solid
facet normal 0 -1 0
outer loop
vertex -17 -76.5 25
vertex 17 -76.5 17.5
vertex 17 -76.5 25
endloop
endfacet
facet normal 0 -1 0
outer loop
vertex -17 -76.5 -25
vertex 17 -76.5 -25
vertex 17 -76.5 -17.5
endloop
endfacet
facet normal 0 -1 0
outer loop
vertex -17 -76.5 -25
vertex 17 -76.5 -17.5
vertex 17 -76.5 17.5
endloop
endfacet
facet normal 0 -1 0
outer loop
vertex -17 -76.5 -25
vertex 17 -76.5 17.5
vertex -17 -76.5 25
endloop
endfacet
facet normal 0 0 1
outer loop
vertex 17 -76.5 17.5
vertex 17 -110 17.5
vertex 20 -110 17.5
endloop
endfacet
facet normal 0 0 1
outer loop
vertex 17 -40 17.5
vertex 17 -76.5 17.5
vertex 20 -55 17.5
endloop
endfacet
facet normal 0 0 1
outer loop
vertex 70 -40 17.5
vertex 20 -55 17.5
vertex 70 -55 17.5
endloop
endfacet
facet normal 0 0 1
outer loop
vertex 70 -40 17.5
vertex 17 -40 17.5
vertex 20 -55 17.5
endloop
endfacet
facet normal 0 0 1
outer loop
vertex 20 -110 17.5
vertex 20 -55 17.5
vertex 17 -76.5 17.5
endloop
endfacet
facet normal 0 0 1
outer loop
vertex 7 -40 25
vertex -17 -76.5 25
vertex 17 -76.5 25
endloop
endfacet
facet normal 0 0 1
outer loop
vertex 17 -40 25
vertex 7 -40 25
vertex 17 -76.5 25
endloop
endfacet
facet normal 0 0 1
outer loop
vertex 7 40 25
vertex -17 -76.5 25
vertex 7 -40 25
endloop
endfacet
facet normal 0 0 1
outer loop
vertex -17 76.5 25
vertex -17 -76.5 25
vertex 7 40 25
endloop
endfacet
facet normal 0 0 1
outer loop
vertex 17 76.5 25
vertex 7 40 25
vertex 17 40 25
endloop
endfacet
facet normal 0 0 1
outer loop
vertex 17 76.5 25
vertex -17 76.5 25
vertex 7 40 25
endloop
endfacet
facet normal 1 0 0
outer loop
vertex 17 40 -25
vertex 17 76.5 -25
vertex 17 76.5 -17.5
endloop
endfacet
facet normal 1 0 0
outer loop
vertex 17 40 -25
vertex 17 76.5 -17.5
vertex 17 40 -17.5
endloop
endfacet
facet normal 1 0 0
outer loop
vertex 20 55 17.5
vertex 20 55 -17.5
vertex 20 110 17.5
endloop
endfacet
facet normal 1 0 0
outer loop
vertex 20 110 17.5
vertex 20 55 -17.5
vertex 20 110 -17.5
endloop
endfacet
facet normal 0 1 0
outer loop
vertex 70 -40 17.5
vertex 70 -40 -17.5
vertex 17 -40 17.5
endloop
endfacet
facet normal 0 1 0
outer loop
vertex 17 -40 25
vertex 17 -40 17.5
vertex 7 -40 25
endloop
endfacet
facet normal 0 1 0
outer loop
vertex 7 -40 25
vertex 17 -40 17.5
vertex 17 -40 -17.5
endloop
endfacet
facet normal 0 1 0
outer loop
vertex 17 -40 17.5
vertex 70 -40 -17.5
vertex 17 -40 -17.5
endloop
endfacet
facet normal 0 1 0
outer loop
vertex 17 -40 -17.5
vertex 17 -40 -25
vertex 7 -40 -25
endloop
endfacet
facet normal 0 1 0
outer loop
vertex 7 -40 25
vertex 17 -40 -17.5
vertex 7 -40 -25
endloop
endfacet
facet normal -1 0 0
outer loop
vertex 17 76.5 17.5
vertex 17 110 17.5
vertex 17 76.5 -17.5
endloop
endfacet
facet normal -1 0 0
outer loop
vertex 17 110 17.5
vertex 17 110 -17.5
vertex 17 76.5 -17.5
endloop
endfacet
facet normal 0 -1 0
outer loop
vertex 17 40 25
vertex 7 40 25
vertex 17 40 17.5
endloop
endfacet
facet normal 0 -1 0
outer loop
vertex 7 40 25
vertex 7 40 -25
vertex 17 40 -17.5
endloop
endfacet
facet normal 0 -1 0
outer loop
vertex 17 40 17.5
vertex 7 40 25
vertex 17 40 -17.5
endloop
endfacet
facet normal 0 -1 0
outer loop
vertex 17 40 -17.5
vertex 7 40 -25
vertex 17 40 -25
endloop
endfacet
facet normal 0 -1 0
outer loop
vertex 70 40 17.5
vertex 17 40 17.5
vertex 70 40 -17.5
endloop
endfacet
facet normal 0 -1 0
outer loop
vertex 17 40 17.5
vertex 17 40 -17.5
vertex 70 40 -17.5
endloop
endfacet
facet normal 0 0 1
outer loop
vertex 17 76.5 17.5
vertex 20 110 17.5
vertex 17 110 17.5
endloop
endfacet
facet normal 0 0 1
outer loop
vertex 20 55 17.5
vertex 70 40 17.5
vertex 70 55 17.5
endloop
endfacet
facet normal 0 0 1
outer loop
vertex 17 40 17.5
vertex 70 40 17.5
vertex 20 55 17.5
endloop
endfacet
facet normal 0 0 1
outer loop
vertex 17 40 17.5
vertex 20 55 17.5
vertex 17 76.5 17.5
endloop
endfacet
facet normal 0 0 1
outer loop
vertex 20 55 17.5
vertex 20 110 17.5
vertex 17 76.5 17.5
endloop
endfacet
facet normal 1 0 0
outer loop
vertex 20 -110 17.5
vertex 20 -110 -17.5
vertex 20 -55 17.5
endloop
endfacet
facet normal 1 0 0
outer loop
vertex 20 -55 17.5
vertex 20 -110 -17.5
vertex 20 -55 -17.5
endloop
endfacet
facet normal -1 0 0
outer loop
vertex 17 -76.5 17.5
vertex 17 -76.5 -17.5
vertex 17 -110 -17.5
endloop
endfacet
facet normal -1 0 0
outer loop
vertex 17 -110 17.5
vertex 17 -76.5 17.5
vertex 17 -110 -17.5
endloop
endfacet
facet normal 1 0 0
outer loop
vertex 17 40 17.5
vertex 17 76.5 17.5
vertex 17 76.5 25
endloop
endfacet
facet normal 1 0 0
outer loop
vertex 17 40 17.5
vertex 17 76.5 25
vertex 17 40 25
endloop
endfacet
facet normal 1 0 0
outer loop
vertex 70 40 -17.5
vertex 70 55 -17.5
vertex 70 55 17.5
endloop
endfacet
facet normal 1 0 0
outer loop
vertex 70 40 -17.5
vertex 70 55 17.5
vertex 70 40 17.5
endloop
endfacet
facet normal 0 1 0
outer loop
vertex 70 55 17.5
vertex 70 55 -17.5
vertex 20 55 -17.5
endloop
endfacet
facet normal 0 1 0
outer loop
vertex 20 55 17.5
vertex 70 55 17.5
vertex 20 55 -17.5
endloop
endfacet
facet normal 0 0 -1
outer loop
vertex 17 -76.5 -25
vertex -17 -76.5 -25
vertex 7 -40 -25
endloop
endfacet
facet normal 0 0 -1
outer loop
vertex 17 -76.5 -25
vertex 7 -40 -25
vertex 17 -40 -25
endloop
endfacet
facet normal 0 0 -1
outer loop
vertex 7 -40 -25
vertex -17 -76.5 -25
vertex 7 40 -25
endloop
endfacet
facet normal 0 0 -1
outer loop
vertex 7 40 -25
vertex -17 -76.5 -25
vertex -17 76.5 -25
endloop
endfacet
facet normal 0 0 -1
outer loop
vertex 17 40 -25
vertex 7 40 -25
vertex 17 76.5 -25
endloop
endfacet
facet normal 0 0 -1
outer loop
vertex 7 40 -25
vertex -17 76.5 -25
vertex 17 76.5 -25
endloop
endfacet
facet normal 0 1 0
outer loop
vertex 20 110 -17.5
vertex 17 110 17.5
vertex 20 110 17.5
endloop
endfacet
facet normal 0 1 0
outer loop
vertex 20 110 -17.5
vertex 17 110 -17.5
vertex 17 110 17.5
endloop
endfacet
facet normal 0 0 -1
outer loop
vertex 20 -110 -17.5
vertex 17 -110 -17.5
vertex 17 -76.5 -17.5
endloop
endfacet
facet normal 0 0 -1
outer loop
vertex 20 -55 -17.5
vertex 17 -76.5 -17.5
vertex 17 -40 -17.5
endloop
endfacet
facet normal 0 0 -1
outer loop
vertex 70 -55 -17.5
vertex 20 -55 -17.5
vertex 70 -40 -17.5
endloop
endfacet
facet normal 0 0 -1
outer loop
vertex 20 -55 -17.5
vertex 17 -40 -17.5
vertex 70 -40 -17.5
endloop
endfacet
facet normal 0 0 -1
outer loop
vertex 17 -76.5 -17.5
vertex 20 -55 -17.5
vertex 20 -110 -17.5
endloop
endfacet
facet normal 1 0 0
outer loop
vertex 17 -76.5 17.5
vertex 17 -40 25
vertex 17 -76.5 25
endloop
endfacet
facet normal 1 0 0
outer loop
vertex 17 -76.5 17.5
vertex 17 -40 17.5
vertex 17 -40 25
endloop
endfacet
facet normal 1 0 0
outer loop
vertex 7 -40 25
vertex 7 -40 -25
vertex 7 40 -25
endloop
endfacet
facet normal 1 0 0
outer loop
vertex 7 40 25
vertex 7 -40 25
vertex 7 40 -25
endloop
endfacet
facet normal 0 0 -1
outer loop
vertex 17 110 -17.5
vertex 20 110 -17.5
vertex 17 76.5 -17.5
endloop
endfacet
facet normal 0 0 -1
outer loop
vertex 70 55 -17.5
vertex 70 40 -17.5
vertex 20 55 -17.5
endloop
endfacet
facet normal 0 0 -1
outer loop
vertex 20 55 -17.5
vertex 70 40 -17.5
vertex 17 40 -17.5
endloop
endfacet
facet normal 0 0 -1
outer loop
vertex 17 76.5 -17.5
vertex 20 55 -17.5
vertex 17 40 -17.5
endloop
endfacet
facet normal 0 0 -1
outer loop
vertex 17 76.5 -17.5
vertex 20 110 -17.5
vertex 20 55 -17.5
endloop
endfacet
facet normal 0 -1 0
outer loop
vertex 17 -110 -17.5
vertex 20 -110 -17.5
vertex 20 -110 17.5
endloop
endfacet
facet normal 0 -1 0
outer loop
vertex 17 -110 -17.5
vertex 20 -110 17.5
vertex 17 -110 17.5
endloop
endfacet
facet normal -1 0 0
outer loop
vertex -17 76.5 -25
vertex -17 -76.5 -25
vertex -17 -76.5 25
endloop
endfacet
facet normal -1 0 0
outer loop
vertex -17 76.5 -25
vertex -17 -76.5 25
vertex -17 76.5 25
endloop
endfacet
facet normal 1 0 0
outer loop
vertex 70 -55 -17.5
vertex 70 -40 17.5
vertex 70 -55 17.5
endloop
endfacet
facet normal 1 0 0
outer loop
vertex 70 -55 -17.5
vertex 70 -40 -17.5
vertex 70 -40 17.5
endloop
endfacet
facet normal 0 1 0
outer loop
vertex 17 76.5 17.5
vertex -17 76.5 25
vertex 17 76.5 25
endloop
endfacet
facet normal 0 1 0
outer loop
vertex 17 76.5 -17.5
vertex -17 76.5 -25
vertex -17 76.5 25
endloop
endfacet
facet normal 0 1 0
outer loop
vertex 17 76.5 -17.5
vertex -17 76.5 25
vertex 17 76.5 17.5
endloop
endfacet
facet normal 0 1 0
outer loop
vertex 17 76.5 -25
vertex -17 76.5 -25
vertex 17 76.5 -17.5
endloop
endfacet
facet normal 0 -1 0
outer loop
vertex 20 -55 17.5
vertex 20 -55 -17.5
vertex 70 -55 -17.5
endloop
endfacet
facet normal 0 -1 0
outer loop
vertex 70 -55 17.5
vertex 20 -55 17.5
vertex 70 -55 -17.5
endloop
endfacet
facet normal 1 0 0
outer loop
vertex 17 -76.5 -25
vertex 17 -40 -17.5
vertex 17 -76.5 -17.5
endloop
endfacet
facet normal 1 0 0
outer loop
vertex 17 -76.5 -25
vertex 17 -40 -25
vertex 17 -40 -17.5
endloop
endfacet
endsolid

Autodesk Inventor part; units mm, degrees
ref_plane "YZ Plane" through (0, 0, 0) normal (1, 0, 0) x (0, 1, 0)
ref_plane "XZ Plane" through (0, 0, 0) normal (0, 1, 0) x (-1, 0, 0)
ref_plane "XY Plane" through (0, 0, 0) normal (0, 0, 1) x (1, 0, 0)
sketch "Sketch1" plane through (0, 0, 0) normal (0, 0, 1) x (1, 0, 0)
  line L0 (0, 113.8) -> (0, -147.3) construction
  line L1 (-34.4, 0) -> (87.4, 0) construction
  line L2 (-17, 76.5) -> (17, 76.5)
  line L3 (17, 76.5) -> (17, -76.5)
  line L4 (17, -76.5) -> (-17, -76.5)
  line L5 (-17, -76.5) -> (-17, 76.5)
  line L6 (-17, 76.5) -> (17, -76.5) construction
  line L7 (17, 76.5) -> (-17, -76.5) construction
  line L8 (7, 40) -> (17, 40)
  line L9 (17, 40) -> (17, -40)
  line L10 (17, -40) -> (7, -40)
  line L11 (7, -40) -> (7, 40)
  line L12 (7, 40) -> (17, -40) construction
  line L13 (17, 40) -> (7, -40) construction
  line L14 (17, -40) -> (70, -40)
  line L15 (70, -40) -> (70, -110)
  line L16 (70, -110) -> (17, -110)
  line L17 (17, -110) -> (17, -40)
  line L18 (70, -110) -> (20, -110)
  line L19 (20, -110) -> (20, -55)
  line L20 (20, -55) -> (70, -55)
  line L21 (70, -55) -> (70, -110)
  point P0 (0, 0)
  point P1 (12, 0)
  dimension "d4" = 80
  dimension "d5" = 153
  dimension "d6" = 34
  dimension "d7" = 10
  dimension "d10" = 70
  dimension "d11" = 55
  dimension "d12" = 53
  dimension "d13" = 3
extrude "Extrusion3" add sketch "Sketch1" along normal mid plane 50 contours L2 L3 L8 L11 L10 L4 L5
extrude "Extrusion4" add sketch "Sketch1" along normal mid plane 35 contours L3 L14 L15 L20 L19 L16 L17
mirror "Mirror1" about plane through (0, 0, 0) normal (0, 1, 0) of "Extrusion4"
properties part number "17-0028-0085"
